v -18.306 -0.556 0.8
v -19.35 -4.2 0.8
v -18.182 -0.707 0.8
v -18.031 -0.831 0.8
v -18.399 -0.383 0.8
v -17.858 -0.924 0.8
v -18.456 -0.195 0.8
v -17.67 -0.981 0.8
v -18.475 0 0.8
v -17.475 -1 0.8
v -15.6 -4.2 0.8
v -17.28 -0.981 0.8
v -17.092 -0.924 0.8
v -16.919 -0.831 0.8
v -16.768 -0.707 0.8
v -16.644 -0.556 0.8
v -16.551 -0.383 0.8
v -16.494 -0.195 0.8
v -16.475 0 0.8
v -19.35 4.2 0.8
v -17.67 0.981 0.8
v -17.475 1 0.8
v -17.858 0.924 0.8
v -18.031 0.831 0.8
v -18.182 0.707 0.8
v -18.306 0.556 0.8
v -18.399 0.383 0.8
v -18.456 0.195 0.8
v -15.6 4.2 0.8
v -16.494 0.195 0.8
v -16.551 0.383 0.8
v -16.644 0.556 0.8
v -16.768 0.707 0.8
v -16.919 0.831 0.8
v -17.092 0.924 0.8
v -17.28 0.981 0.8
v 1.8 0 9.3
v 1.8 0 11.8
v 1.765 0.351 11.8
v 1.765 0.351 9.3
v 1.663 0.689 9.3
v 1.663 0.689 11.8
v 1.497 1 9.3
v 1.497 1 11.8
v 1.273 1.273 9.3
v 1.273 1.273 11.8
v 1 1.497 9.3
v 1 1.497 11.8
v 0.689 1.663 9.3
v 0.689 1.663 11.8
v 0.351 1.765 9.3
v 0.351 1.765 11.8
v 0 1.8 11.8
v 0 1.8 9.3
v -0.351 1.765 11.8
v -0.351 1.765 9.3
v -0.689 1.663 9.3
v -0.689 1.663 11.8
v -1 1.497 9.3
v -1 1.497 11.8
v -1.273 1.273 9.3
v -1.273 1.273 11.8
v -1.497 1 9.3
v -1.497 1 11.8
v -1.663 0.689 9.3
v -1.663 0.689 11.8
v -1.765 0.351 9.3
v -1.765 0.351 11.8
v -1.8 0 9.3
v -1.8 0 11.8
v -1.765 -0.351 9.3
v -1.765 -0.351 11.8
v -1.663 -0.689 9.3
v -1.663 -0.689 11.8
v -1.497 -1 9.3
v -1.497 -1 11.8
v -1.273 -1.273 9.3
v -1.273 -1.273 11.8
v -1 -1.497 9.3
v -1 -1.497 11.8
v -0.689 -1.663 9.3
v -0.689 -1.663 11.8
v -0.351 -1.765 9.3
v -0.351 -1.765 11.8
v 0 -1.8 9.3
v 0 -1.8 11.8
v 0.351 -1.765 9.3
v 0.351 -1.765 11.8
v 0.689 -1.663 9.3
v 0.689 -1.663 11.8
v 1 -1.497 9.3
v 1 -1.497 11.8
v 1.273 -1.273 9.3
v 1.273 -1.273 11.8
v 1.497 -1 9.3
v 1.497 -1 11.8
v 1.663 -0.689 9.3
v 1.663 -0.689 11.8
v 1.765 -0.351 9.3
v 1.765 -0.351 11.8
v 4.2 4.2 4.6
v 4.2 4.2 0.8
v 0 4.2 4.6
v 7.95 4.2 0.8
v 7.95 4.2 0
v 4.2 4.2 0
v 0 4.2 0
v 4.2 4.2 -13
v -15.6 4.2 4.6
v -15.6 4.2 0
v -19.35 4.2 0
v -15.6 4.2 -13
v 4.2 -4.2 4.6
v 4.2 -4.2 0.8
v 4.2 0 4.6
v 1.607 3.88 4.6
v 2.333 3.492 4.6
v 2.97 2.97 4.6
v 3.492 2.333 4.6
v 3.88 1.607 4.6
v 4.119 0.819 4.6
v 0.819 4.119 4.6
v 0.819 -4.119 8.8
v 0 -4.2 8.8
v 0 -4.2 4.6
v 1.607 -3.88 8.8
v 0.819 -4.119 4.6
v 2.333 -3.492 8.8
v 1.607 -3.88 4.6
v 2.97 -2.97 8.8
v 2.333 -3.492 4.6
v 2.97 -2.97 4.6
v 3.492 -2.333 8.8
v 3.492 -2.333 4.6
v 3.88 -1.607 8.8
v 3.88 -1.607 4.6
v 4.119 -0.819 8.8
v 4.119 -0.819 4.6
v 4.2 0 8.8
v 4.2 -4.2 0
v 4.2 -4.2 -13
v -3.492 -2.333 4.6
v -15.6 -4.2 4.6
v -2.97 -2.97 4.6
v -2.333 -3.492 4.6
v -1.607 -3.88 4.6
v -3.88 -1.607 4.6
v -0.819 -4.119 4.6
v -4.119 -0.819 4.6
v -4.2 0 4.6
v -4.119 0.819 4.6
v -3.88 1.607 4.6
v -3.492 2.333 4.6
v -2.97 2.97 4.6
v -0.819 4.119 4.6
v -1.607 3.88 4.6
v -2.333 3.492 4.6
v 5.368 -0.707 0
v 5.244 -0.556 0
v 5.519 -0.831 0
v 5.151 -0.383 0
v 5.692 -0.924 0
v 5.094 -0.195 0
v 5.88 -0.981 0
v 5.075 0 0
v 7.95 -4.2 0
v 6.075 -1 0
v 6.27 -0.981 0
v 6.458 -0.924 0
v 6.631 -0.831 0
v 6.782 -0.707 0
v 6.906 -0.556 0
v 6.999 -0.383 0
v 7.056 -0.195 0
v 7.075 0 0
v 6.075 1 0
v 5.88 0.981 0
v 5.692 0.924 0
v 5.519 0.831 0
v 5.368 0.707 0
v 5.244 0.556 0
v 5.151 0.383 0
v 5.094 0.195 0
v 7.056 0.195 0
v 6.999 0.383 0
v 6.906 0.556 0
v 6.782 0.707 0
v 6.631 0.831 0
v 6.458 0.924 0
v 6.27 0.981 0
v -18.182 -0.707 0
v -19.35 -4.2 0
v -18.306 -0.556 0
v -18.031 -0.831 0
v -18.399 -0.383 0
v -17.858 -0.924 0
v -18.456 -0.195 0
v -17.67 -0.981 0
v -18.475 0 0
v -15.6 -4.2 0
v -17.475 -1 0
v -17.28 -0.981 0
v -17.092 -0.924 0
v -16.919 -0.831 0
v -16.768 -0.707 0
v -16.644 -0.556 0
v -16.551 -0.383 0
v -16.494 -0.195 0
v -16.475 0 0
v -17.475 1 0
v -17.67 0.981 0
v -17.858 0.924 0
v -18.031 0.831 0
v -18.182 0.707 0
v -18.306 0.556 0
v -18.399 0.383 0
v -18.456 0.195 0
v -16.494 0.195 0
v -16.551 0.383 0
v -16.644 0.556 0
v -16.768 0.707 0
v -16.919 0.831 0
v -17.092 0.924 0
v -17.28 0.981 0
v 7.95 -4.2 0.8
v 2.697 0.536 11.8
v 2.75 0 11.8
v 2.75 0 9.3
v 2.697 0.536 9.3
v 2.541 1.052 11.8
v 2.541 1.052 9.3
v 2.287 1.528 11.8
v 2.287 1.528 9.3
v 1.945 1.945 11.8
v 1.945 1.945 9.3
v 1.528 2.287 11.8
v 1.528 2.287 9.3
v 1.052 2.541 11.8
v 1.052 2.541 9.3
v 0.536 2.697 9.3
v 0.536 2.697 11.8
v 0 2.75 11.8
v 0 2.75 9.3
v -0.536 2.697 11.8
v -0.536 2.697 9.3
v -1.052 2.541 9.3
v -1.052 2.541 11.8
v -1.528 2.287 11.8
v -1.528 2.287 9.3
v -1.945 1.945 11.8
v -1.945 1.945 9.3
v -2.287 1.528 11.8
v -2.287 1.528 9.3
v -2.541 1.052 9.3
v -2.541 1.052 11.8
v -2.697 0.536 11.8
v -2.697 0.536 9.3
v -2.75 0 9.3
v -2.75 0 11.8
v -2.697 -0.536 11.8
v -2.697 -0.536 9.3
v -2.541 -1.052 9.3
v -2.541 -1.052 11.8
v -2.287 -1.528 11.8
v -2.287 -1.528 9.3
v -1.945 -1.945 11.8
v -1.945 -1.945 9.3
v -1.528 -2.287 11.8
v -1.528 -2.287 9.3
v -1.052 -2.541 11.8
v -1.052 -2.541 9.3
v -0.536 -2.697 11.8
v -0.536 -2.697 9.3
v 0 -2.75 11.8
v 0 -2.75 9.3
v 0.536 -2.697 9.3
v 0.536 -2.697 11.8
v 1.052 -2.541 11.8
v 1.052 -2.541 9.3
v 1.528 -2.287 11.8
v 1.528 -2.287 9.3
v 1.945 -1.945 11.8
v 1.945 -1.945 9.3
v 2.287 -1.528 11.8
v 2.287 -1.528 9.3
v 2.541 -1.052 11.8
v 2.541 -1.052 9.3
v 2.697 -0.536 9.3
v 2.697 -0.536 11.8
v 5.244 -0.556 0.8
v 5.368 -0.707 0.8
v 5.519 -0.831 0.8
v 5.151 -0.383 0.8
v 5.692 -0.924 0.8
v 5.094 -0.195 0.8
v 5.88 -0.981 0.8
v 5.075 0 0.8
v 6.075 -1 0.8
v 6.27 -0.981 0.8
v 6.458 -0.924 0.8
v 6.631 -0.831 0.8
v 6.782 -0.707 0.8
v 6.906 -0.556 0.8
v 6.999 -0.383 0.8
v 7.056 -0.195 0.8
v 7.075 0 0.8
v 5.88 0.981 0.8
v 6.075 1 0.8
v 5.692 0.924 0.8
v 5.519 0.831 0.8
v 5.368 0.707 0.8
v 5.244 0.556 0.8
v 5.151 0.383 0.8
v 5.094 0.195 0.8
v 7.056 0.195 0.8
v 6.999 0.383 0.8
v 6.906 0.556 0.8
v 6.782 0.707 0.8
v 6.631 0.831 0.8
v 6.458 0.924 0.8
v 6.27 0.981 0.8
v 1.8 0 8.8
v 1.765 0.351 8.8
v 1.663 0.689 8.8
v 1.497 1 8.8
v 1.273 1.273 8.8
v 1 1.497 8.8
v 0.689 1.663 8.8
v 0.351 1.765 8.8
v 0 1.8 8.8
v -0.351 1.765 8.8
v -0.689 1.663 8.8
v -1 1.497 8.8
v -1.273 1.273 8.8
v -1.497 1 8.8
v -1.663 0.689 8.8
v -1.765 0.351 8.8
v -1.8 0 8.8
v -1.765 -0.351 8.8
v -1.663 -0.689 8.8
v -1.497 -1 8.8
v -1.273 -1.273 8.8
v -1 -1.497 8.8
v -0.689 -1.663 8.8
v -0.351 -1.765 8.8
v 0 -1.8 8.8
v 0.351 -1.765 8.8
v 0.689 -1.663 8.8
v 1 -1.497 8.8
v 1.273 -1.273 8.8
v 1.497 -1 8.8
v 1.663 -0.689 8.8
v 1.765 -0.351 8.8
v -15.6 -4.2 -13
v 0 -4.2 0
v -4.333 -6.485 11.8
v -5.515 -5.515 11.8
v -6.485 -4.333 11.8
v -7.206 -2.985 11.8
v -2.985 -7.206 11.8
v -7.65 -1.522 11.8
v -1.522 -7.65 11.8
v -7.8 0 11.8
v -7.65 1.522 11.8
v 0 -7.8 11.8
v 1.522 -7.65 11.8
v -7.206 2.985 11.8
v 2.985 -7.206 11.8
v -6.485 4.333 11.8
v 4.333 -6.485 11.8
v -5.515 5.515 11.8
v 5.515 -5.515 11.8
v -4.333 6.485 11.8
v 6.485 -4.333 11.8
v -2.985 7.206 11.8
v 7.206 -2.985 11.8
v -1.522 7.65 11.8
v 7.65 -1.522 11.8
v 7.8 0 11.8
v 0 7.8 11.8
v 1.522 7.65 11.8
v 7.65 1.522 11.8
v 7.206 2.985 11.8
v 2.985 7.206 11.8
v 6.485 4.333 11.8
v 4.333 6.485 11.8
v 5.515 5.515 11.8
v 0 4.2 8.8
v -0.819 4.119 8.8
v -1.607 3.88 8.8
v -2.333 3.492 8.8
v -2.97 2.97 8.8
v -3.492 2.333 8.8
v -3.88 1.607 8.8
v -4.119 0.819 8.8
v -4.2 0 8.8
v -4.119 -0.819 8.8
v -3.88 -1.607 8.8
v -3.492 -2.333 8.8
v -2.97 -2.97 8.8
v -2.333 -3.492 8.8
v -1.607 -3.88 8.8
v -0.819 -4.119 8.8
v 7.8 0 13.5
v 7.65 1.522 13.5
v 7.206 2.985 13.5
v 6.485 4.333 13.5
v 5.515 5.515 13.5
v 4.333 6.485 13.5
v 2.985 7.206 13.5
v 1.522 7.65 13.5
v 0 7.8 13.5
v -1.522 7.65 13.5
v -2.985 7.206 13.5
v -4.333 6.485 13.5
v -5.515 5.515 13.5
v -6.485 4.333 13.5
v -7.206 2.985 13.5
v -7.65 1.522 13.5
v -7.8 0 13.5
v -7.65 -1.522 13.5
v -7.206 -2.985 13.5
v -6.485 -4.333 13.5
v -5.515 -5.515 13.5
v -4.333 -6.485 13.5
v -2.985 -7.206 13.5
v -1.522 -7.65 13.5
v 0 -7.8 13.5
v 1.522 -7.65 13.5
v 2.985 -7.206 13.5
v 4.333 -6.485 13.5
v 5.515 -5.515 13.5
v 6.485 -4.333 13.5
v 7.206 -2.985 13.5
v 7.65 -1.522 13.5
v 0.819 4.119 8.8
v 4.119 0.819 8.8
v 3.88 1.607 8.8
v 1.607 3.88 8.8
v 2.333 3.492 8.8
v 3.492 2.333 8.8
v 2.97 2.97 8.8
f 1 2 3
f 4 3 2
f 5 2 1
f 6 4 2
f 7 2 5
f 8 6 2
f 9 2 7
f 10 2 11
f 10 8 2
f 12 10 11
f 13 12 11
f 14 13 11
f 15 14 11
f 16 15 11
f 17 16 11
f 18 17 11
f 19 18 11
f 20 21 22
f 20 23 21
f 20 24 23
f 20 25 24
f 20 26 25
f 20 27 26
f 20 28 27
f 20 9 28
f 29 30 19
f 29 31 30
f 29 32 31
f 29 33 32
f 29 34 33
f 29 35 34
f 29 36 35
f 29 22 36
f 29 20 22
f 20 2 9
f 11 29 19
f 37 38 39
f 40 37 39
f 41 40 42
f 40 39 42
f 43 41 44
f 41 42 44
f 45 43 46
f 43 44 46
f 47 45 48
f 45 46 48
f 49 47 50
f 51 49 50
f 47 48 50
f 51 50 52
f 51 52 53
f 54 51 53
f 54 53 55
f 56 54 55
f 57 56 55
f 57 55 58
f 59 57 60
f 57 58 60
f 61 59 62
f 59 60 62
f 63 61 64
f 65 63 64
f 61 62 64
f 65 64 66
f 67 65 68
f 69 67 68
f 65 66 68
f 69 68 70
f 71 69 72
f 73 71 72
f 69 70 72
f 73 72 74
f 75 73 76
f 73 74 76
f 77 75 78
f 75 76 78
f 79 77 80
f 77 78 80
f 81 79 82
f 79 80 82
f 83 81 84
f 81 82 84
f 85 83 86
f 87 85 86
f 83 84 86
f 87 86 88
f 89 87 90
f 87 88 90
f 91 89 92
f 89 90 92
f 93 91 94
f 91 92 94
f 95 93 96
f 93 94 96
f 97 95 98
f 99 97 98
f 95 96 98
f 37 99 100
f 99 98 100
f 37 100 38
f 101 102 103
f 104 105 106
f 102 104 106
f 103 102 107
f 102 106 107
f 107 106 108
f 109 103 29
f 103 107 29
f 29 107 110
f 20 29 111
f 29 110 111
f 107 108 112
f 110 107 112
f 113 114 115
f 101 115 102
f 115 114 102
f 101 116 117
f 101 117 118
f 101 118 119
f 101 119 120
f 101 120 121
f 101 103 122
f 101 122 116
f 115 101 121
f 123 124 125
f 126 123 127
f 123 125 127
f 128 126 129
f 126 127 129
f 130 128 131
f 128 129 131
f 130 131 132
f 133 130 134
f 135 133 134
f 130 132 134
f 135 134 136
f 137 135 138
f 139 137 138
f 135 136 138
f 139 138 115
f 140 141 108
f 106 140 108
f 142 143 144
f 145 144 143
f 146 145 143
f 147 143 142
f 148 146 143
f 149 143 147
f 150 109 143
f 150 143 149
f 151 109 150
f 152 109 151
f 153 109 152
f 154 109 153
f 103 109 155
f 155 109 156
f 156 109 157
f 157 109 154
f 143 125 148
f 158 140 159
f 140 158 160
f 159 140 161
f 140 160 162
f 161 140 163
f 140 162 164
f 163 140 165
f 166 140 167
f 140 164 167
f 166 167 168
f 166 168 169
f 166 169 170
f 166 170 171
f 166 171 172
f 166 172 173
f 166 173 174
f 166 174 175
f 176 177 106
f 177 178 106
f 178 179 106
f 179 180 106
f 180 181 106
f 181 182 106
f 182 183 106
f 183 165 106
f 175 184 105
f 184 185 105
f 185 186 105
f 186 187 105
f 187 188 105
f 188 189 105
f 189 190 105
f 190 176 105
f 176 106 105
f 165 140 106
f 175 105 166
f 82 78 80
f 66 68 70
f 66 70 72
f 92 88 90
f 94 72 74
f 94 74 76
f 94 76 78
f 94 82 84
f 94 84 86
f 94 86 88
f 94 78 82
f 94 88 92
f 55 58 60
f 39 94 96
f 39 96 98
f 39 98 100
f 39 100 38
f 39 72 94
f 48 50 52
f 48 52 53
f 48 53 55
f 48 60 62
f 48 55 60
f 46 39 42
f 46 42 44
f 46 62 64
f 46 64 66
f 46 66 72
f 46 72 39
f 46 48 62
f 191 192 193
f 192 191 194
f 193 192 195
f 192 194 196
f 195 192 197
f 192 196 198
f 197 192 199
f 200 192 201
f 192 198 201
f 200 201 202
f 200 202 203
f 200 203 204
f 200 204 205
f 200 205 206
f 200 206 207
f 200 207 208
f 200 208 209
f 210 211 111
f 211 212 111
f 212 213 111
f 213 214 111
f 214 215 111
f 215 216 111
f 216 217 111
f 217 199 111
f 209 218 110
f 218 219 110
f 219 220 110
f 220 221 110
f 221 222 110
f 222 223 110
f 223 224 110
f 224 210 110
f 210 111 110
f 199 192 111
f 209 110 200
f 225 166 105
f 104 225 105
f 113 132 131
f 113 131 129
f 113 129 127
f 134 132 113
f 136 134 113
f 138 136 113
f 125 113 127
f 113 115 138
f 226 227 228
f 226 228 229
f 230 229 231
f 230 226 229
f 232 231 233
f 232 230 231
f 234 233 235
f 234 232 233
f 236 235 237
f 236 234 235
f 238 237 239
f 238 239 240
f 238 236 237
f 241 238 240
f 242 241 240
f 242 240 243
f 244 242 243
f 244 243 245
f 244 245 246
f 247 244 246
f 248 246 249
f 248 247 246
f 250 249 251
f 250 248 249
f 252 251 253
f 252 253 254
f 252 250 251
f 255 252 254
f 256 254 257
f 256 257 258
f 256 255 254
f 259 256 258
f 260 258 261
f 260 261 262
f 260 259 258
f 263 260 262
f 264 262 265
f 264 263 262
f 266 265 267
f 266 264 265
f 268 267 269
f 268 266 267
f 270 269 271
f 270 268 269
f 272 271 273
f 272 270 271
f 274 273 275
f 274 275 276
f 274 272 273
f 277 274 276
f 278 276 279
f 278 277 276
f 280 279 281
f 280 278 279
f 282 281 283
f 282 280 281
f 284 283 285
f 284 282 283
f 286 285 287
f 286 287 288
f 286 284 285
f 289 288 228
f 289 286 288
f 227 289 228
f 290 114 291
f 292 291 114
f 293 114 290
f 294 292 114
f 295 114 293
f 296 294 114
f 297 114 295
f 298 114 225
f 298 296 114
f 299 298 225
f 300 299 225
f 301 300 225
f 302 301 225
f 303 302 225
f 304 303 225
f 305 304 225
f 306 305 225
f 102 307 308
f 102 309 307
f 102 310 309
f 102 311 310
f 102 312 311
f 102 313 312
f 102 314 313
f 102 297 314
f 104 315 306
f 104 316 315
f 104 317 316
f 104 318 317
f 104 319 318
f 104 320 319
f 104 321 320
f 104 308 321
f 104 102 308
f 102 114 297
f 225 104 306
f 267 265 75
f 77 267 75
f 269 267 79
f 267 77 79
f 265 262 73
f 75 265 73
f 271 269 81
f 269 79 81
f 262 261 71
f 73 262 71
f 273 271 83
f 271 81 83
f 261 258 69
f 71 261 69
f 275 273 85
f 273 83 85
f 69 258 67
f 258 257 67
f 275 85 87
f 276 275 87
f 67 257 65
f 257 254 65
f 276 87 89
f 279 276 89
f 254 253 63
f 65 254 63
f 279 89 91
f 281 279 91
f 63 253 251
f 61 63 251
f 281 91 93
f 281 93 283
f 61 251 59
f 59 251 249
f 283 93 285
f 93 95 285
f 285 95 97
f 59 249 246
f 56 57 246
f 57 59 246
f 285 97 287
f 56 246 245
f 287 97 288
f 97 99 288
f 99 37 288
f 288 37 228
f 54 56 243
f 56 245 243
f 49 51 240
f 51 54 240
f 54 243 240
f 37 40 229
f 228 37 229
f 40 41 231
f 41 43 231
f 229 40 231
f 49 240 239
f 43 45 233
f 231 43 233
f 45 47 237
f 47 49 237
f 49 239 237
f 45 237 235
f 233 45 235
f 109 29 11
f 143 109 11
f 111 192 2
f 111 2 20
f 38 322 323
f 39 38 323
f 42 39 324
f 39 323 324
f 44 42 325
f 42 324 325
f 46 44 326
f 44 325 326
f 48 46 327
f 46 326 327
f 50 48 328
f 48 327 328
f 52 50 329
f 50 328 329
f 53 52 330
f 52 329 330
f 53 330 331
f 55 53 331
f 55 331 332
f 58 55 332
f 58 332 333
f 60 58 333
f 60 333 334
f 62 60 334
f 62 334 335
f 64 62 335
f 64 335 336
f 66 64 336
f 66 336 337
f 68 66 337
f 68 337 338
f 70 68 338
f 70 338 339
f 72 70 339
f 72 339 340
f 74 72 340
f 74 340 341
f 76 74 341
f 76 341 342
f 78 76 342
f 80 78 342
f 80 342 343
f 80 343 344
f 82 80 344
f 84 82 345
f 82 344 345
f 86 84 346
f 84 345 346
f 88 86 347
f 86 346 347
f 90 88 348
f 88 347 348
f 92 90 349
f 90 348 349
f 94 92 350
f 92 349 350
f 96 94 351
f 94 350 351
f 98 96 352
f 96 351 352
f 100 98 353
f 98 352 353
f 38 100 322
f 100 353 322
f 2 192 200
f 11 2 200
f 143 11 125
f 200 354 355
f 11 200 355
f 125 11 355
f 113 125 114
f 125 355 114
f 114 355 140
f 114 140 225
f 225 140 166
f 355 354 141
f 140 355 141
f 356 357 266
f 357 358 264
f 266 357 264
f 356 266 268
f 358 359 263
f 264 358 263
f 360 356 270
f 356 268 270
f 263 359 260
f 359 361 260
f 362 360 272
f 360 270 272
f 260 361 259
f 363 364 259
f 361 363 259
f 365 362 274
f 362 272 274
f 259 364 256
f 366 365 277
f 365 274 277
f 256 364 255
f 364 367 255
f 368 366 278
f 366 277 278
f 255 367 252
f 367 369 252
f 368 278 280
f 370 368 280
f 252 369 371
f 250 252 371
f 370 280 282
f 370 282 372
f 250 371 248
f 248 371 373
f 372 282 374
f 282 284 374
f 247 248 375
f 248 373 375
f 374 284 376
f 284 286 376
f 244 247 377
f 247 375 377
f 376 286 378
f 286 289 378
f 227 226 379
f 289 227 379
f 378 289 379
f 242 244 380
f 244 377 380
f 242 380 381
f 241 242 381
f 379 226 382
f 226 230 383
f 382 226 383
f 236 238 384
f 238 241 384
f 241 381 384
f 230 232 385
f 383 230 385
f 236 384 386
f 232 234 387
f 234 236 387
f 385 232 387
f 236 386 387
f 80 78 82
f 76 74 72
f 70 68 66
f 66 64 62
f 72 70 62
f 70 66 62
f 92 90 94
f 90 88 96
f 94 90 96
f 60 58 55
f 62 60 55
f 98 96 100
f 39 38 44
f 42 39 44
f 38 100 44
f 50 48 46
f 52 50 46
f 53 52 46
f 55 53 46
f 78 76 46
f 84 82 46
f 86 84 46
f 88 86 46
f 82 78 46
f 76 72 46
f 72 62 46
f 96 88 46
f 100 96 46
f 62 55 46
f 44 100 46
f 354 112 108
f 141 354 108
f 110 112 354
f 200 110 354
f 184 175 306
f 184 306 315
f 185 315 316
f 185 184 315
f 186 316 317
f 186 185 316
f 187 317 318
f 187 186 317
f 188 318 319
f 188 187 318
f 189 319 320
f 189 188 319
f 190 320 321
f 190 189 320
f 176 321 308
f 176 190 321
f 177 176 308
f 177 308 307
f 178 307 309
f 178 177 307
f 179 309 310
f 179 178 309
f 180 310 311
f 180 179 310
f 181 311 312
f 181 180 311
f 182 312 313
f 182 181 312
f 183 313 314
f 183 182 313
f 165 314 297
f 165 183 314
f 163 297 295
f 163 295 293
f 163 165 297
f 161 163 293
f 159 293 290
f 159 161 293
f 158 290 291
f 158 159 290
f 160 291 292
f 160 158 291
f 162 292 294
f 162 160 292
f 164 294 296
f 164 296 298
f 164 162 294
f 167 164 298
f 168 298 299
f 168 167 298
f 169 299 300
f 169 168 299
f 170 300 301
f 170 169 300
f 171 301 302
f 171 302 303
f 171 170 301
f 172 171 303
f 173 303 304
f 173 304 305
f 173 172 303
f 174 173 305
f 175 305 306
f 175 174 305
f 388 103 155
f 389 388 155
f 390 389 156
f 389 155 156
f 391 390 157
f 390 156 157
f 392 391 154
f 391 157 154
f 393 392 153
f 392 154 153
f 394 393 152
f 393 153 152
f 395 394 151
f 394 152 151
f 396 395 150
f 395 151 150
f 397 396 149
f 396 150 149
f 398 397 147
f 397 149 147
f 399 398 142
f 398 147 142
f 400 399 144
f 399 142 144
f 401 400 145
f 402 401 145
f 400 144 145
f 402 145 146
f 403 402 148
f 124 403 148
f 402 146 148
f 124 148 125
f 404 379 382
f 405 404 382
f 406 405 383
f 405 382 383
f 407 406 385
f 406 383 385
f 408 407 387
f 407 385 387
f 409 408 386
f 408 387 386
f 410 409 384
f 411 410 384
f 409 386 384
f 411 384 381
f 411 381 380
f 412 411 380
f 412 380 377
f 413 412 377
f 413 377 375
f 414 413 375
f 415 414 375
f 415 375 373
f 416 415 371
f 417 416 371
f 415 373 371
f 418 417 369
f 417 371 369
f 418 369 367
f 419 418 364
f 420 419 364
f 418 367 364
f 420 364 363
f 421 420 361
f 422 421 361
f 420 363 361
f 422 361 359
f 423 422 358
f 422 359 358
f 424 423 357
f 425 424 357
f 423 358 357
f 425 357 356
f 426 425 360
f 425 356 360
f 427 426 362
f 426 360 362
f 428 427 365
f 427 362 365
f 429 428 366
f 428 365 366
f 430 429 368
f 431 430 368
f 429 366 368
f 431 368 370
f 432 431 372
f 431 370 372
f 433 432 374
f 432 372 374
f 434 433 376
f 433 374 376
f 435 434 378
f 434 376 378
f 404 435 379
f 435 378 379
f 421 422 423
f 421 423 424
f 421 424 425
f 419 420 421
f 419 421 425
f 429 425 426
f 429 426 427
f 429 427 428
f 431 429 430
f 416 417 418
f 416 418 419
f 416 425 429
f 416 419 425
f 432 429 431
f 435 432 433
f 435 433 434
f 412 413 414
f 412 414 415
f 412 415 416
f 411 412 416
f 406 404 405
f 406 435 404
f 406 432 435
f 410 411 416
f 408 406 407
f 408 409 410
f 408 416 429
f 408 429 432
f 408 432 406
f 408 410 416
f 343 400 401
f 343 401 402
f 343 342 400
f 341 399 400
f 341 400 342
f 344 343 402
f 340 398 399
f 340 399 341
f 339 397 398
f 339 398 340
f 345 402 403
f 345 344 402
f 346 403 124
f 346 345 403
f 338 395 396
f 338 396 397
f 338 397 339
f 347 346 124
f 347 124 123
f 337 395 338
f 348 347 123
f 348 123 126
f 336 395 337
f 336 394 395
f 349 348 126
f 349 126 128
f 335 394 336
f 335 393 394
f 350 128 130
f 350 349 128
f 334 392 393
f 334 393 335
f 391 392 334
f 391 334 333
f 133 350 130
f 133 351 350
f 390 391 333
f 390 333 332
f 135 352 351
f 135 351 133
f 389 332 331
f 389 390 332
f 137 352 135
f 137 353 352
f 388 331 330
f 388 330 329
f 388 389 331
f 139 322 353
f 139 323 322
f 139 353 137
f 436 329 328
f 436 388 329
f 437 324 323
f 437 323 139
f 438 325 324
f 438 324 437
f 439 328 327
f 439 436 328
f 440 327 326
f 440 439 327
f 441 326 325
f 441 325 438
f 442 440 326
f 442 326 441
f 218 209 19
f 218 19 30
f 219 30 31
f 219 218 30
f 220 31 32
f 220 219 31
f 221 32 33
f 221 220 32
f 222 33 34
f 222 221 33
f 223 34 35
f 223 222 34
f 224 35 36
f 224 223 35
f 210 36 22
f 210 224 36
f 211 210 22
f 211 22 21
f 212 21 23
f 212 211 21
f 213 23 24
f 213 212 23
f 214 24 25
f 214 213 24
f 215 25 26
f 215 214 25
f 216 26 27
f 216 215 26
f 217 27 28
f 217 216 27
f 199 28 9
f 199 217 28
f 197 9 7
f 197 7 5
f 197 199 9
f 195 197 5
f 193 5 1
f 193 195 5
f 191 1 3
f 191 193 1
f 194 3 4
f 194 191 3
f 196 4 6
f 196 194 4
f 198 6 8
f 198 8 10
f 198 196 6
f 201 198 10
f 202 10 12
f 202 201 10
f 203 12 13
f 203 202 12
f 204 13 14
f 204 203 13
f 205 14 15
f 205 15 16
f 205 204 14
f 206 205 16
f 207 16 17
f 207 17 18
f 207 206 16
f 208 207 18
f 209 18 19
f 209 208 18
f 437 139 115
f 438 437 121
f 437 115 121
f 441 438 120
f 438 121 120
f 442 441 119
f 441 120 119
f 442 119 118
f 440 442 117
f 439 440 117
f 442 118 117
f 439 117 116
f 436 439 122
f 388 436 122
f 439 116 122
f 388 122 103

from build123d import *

# Parameters (mm, degrees)
F0_R          = 1.8
F1_DEPTH      = 13
F1_DEPTH_BACK = 4.6
F0_W          = 3.75
F0_H          = 8.4
F0_R_2        = 1
F2_DEPTH      = 0.8
F3_DEPTH      = 8.8
F4_DEPTH      = 11.8
F5_R          = 2.75
F5_R_2        = 1.8
F6_DEPTH      = 2.5
F5_R_3        = 7.8
F7_DEPTH      = 1.7


with BuildPart() as f1:
    # F0 (on Top) → F1 (new body, two sides)
    with BuildSketch(Plane.XY) as f1_sk:
        with BuildLine():
            Line((0, 4.2), (-15.6, 4.2))
            Line((-15.6, 4.2), (-15.6, -4.2))
            Line((-15.6, -4.2), (0, -4.2))
            ThreePointArc((0, -4.2), (-4.2, 0), (0, 4.2))
        make_face()
        with BuildLine():
            ThreePointArc((4.2, 0), (2.969848481, 2.969848481), (0, 4.2))
            ThreePointArc((0, 4.2), (-4.2, 0), (0, -4.2))
            ThreePointArc((0, -4.2), (2.969848481, -2.969848481), (4.2, 0))
        make_face()
        Circle(F0_R, mode=Mode.SUBTRACT)
        Circle(F0_R)
        with BuildLine():
            Line((4.2, 4.2), (0, 4.2))
            ThreePointArc((0, 4.2), (2.969848481, 2.969848481), (4.2, 0))
            Line((4.2, 0), (4.2, 4.2))
        make_face()
        with BuildLine():
            Line((4.2, -4.2), (4.2, 0))
            ThreePointArc((4.2, 0), (2.969848481, -2.969848481), (0, -4.2))
            Line((0, -4.2), (4.2, -4.2))
        make_face()
    extrude(amount=-F1_DEPTH)
    extrude(f1_sk.sketch, amount=F1_DEPTH_BACK)

    # F0 (on Top) → F2 (join)
    with BuildSketch(Plane.XY):
        with Locations((-17.475, 0)):
            Rectangle(F0_W, F0_H)
        with Locations((-17.475, 0)):
            Circle(F0_R_2, mode=Mode.SUBTRACT)
        Polygon((7.95, 4.2), (4.2, 4.2), (4.2, 0), (4.2, -4.2), (7.95, -4.2), align=None)
        with Locations((6.075, 0)):
            Circle(F0_R_2, mode=Mode.SUBTRACT)
    extrude(amount=F2_DEPTH)

    # F0 (on Top) → F3 (join)
    with BuildSketch(Plane.XY):
        with BuildLine():
            ThreePointArc((4.2, 0), (2.969848481, 2.969848481), (0, 4.2))
            ThreePointArc((0, 4.2), (-4.2, 0), (0, -4.2))
            ThreePointArc((0, -4.2), (2.969848481, -2.969848481), (4.2, 0))
        make_face()
        Circle(F0_R, mode=Mode.SUBTRACT)
        Circle(F0_R)
    extrude(amount=F3_DEPTH)

    # F0 (on Top) → F4 (join)
    with BuildSketch(Plane.XY):
        Circle(F0_R)
    extrude(amount=F4_DEPTH)


with BuildPart() as f6:
    # F5 (on face) → F6 (new body)
    with BuildSketch(Plane.XY.offset(11.8)):
        Circle(F5_R)
        Circle(F5_R_2, mode=Mode.SUBTRACT)
    extrude(amount=-F6_DEPTH)

    # F5 (on face) → F7 (join)
    with BuildSketch(Plane.XY.offset(11.8)):
        Circle(F5_R_3)
        Circle(F5_R, mode=Mode.SUBTRACT)
        Circle(F5_R)
        Circle(F5_R_2, mode=Mode.SUBTRACT)
        Circle(F5_R_2)
    extrude(amount=F7_DEPTH)


solid = Compound([f1.part, f6.part])
